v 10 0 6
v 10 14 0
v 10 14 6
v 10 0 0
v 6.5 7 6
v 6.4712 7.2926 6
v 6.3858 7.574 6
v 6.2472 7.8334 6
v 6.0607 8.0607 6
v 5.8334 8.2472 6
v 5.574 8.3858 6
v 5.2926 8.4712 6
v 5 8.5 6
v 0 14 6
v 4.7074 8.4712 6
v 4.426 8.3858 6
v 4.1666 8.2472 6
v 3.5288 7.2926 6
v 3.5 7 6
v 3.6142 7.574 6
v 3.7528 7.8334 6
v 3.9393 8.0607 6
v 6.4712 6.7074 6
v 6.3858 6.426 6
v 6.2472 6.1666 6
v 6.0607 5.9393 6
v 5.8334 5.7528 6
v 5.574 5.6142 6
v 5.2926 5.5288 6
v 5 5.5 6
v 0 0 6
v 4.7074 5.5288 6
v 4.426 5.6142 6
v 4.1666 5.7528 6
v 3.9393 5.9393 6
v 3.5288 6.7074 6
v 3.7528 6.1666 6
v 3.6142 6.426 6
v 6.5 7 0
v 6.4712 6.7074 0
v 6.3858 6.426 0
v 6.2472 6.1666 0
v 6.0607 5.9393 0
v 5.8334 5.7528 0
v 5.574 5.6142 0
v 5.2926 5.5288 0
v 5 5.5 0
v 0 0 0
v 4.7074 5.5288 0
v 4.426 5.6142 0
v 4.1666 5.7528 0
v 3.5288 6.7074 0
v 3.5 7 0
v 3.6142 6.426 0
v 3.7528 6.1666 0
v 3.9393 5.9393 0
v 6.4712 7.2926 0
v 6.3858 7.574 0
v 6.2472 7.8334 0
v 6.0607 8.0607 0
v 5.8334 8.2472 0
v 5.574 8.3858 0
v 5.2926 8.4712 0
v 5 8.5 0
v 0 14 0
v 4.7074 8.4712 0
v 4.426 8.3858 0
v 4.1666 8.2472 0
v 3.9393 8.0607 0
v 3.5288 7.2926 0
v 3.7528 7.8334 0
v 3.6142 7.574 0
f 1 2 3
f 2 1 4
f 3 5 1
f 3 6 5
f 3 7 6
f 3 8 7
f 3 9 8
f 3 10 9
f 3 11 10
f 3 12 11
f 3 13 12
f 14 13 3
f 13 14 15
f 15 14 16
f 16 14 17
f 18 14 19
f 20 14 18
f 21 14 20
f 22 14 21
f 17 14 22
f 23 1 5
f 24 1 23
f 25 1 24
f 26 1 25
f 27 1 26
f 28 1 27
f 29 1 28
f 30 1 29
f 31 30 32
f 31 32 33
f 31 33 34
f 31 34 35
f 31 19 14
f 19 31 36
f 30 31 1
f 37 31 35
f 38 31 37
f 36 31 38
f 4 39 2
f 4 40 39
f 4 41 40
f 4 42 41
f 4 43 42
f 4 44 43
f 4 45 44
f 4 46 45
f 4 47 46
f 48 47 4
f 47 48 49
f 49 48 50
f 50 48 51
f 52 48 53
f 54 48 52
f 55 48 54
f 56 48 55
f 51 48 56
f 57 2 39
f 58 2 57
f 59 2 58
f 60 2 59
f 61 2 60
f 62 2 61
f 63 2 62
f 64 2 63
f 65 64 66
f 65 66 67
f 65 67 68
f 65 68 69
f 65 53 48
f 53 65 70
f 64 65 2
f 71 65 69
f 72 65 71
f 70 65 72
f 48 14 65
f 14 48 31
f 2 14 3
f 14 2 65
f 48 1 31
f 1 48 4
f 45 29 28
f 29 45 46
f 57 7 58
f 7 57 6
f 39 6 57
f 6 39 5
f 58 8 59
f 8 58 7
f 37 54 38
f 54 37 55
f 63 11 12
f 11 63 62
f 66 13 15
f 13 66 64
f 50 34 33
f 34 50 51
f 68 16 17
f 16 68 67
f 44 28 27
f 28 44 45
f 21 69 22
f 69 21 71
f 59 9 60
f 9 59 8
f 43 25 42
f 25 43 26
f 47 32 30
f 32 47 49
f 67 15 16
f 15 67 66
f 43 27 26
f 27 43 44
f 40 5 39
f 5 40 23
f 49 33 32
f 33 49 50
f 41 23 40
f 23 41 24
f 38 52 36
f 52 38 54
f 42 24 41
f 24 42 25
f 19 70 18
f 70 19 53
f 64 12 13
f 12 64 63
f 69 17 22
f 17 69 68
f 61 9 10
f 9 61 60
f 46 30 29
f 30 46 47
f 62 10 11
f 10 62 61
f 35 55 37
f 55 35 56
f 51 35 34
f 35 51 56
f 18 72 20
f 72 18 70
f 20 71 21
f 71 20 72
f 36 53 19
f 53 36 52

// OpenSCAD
$fn = 32;

// ----------------------------------------------------------------------
// Micro pad: drilled pad, 5-20 mm class
// ----------------------------------------------------------------------

// --- parameters (mm) ---
pad_l = 10;               // pad length, X
pad_w = 14;               // pad width, Y
pad_t = 6;                // pad thickness, Z
hole_d = 3;               // through hole diameter

difference() {
  cube([pad_l, pad_w, pad_t]);
  translate([pad_l / 2, pad_w / 2, -1])
    cylinder(h = pad_t + 2, d = hole_d);
}
